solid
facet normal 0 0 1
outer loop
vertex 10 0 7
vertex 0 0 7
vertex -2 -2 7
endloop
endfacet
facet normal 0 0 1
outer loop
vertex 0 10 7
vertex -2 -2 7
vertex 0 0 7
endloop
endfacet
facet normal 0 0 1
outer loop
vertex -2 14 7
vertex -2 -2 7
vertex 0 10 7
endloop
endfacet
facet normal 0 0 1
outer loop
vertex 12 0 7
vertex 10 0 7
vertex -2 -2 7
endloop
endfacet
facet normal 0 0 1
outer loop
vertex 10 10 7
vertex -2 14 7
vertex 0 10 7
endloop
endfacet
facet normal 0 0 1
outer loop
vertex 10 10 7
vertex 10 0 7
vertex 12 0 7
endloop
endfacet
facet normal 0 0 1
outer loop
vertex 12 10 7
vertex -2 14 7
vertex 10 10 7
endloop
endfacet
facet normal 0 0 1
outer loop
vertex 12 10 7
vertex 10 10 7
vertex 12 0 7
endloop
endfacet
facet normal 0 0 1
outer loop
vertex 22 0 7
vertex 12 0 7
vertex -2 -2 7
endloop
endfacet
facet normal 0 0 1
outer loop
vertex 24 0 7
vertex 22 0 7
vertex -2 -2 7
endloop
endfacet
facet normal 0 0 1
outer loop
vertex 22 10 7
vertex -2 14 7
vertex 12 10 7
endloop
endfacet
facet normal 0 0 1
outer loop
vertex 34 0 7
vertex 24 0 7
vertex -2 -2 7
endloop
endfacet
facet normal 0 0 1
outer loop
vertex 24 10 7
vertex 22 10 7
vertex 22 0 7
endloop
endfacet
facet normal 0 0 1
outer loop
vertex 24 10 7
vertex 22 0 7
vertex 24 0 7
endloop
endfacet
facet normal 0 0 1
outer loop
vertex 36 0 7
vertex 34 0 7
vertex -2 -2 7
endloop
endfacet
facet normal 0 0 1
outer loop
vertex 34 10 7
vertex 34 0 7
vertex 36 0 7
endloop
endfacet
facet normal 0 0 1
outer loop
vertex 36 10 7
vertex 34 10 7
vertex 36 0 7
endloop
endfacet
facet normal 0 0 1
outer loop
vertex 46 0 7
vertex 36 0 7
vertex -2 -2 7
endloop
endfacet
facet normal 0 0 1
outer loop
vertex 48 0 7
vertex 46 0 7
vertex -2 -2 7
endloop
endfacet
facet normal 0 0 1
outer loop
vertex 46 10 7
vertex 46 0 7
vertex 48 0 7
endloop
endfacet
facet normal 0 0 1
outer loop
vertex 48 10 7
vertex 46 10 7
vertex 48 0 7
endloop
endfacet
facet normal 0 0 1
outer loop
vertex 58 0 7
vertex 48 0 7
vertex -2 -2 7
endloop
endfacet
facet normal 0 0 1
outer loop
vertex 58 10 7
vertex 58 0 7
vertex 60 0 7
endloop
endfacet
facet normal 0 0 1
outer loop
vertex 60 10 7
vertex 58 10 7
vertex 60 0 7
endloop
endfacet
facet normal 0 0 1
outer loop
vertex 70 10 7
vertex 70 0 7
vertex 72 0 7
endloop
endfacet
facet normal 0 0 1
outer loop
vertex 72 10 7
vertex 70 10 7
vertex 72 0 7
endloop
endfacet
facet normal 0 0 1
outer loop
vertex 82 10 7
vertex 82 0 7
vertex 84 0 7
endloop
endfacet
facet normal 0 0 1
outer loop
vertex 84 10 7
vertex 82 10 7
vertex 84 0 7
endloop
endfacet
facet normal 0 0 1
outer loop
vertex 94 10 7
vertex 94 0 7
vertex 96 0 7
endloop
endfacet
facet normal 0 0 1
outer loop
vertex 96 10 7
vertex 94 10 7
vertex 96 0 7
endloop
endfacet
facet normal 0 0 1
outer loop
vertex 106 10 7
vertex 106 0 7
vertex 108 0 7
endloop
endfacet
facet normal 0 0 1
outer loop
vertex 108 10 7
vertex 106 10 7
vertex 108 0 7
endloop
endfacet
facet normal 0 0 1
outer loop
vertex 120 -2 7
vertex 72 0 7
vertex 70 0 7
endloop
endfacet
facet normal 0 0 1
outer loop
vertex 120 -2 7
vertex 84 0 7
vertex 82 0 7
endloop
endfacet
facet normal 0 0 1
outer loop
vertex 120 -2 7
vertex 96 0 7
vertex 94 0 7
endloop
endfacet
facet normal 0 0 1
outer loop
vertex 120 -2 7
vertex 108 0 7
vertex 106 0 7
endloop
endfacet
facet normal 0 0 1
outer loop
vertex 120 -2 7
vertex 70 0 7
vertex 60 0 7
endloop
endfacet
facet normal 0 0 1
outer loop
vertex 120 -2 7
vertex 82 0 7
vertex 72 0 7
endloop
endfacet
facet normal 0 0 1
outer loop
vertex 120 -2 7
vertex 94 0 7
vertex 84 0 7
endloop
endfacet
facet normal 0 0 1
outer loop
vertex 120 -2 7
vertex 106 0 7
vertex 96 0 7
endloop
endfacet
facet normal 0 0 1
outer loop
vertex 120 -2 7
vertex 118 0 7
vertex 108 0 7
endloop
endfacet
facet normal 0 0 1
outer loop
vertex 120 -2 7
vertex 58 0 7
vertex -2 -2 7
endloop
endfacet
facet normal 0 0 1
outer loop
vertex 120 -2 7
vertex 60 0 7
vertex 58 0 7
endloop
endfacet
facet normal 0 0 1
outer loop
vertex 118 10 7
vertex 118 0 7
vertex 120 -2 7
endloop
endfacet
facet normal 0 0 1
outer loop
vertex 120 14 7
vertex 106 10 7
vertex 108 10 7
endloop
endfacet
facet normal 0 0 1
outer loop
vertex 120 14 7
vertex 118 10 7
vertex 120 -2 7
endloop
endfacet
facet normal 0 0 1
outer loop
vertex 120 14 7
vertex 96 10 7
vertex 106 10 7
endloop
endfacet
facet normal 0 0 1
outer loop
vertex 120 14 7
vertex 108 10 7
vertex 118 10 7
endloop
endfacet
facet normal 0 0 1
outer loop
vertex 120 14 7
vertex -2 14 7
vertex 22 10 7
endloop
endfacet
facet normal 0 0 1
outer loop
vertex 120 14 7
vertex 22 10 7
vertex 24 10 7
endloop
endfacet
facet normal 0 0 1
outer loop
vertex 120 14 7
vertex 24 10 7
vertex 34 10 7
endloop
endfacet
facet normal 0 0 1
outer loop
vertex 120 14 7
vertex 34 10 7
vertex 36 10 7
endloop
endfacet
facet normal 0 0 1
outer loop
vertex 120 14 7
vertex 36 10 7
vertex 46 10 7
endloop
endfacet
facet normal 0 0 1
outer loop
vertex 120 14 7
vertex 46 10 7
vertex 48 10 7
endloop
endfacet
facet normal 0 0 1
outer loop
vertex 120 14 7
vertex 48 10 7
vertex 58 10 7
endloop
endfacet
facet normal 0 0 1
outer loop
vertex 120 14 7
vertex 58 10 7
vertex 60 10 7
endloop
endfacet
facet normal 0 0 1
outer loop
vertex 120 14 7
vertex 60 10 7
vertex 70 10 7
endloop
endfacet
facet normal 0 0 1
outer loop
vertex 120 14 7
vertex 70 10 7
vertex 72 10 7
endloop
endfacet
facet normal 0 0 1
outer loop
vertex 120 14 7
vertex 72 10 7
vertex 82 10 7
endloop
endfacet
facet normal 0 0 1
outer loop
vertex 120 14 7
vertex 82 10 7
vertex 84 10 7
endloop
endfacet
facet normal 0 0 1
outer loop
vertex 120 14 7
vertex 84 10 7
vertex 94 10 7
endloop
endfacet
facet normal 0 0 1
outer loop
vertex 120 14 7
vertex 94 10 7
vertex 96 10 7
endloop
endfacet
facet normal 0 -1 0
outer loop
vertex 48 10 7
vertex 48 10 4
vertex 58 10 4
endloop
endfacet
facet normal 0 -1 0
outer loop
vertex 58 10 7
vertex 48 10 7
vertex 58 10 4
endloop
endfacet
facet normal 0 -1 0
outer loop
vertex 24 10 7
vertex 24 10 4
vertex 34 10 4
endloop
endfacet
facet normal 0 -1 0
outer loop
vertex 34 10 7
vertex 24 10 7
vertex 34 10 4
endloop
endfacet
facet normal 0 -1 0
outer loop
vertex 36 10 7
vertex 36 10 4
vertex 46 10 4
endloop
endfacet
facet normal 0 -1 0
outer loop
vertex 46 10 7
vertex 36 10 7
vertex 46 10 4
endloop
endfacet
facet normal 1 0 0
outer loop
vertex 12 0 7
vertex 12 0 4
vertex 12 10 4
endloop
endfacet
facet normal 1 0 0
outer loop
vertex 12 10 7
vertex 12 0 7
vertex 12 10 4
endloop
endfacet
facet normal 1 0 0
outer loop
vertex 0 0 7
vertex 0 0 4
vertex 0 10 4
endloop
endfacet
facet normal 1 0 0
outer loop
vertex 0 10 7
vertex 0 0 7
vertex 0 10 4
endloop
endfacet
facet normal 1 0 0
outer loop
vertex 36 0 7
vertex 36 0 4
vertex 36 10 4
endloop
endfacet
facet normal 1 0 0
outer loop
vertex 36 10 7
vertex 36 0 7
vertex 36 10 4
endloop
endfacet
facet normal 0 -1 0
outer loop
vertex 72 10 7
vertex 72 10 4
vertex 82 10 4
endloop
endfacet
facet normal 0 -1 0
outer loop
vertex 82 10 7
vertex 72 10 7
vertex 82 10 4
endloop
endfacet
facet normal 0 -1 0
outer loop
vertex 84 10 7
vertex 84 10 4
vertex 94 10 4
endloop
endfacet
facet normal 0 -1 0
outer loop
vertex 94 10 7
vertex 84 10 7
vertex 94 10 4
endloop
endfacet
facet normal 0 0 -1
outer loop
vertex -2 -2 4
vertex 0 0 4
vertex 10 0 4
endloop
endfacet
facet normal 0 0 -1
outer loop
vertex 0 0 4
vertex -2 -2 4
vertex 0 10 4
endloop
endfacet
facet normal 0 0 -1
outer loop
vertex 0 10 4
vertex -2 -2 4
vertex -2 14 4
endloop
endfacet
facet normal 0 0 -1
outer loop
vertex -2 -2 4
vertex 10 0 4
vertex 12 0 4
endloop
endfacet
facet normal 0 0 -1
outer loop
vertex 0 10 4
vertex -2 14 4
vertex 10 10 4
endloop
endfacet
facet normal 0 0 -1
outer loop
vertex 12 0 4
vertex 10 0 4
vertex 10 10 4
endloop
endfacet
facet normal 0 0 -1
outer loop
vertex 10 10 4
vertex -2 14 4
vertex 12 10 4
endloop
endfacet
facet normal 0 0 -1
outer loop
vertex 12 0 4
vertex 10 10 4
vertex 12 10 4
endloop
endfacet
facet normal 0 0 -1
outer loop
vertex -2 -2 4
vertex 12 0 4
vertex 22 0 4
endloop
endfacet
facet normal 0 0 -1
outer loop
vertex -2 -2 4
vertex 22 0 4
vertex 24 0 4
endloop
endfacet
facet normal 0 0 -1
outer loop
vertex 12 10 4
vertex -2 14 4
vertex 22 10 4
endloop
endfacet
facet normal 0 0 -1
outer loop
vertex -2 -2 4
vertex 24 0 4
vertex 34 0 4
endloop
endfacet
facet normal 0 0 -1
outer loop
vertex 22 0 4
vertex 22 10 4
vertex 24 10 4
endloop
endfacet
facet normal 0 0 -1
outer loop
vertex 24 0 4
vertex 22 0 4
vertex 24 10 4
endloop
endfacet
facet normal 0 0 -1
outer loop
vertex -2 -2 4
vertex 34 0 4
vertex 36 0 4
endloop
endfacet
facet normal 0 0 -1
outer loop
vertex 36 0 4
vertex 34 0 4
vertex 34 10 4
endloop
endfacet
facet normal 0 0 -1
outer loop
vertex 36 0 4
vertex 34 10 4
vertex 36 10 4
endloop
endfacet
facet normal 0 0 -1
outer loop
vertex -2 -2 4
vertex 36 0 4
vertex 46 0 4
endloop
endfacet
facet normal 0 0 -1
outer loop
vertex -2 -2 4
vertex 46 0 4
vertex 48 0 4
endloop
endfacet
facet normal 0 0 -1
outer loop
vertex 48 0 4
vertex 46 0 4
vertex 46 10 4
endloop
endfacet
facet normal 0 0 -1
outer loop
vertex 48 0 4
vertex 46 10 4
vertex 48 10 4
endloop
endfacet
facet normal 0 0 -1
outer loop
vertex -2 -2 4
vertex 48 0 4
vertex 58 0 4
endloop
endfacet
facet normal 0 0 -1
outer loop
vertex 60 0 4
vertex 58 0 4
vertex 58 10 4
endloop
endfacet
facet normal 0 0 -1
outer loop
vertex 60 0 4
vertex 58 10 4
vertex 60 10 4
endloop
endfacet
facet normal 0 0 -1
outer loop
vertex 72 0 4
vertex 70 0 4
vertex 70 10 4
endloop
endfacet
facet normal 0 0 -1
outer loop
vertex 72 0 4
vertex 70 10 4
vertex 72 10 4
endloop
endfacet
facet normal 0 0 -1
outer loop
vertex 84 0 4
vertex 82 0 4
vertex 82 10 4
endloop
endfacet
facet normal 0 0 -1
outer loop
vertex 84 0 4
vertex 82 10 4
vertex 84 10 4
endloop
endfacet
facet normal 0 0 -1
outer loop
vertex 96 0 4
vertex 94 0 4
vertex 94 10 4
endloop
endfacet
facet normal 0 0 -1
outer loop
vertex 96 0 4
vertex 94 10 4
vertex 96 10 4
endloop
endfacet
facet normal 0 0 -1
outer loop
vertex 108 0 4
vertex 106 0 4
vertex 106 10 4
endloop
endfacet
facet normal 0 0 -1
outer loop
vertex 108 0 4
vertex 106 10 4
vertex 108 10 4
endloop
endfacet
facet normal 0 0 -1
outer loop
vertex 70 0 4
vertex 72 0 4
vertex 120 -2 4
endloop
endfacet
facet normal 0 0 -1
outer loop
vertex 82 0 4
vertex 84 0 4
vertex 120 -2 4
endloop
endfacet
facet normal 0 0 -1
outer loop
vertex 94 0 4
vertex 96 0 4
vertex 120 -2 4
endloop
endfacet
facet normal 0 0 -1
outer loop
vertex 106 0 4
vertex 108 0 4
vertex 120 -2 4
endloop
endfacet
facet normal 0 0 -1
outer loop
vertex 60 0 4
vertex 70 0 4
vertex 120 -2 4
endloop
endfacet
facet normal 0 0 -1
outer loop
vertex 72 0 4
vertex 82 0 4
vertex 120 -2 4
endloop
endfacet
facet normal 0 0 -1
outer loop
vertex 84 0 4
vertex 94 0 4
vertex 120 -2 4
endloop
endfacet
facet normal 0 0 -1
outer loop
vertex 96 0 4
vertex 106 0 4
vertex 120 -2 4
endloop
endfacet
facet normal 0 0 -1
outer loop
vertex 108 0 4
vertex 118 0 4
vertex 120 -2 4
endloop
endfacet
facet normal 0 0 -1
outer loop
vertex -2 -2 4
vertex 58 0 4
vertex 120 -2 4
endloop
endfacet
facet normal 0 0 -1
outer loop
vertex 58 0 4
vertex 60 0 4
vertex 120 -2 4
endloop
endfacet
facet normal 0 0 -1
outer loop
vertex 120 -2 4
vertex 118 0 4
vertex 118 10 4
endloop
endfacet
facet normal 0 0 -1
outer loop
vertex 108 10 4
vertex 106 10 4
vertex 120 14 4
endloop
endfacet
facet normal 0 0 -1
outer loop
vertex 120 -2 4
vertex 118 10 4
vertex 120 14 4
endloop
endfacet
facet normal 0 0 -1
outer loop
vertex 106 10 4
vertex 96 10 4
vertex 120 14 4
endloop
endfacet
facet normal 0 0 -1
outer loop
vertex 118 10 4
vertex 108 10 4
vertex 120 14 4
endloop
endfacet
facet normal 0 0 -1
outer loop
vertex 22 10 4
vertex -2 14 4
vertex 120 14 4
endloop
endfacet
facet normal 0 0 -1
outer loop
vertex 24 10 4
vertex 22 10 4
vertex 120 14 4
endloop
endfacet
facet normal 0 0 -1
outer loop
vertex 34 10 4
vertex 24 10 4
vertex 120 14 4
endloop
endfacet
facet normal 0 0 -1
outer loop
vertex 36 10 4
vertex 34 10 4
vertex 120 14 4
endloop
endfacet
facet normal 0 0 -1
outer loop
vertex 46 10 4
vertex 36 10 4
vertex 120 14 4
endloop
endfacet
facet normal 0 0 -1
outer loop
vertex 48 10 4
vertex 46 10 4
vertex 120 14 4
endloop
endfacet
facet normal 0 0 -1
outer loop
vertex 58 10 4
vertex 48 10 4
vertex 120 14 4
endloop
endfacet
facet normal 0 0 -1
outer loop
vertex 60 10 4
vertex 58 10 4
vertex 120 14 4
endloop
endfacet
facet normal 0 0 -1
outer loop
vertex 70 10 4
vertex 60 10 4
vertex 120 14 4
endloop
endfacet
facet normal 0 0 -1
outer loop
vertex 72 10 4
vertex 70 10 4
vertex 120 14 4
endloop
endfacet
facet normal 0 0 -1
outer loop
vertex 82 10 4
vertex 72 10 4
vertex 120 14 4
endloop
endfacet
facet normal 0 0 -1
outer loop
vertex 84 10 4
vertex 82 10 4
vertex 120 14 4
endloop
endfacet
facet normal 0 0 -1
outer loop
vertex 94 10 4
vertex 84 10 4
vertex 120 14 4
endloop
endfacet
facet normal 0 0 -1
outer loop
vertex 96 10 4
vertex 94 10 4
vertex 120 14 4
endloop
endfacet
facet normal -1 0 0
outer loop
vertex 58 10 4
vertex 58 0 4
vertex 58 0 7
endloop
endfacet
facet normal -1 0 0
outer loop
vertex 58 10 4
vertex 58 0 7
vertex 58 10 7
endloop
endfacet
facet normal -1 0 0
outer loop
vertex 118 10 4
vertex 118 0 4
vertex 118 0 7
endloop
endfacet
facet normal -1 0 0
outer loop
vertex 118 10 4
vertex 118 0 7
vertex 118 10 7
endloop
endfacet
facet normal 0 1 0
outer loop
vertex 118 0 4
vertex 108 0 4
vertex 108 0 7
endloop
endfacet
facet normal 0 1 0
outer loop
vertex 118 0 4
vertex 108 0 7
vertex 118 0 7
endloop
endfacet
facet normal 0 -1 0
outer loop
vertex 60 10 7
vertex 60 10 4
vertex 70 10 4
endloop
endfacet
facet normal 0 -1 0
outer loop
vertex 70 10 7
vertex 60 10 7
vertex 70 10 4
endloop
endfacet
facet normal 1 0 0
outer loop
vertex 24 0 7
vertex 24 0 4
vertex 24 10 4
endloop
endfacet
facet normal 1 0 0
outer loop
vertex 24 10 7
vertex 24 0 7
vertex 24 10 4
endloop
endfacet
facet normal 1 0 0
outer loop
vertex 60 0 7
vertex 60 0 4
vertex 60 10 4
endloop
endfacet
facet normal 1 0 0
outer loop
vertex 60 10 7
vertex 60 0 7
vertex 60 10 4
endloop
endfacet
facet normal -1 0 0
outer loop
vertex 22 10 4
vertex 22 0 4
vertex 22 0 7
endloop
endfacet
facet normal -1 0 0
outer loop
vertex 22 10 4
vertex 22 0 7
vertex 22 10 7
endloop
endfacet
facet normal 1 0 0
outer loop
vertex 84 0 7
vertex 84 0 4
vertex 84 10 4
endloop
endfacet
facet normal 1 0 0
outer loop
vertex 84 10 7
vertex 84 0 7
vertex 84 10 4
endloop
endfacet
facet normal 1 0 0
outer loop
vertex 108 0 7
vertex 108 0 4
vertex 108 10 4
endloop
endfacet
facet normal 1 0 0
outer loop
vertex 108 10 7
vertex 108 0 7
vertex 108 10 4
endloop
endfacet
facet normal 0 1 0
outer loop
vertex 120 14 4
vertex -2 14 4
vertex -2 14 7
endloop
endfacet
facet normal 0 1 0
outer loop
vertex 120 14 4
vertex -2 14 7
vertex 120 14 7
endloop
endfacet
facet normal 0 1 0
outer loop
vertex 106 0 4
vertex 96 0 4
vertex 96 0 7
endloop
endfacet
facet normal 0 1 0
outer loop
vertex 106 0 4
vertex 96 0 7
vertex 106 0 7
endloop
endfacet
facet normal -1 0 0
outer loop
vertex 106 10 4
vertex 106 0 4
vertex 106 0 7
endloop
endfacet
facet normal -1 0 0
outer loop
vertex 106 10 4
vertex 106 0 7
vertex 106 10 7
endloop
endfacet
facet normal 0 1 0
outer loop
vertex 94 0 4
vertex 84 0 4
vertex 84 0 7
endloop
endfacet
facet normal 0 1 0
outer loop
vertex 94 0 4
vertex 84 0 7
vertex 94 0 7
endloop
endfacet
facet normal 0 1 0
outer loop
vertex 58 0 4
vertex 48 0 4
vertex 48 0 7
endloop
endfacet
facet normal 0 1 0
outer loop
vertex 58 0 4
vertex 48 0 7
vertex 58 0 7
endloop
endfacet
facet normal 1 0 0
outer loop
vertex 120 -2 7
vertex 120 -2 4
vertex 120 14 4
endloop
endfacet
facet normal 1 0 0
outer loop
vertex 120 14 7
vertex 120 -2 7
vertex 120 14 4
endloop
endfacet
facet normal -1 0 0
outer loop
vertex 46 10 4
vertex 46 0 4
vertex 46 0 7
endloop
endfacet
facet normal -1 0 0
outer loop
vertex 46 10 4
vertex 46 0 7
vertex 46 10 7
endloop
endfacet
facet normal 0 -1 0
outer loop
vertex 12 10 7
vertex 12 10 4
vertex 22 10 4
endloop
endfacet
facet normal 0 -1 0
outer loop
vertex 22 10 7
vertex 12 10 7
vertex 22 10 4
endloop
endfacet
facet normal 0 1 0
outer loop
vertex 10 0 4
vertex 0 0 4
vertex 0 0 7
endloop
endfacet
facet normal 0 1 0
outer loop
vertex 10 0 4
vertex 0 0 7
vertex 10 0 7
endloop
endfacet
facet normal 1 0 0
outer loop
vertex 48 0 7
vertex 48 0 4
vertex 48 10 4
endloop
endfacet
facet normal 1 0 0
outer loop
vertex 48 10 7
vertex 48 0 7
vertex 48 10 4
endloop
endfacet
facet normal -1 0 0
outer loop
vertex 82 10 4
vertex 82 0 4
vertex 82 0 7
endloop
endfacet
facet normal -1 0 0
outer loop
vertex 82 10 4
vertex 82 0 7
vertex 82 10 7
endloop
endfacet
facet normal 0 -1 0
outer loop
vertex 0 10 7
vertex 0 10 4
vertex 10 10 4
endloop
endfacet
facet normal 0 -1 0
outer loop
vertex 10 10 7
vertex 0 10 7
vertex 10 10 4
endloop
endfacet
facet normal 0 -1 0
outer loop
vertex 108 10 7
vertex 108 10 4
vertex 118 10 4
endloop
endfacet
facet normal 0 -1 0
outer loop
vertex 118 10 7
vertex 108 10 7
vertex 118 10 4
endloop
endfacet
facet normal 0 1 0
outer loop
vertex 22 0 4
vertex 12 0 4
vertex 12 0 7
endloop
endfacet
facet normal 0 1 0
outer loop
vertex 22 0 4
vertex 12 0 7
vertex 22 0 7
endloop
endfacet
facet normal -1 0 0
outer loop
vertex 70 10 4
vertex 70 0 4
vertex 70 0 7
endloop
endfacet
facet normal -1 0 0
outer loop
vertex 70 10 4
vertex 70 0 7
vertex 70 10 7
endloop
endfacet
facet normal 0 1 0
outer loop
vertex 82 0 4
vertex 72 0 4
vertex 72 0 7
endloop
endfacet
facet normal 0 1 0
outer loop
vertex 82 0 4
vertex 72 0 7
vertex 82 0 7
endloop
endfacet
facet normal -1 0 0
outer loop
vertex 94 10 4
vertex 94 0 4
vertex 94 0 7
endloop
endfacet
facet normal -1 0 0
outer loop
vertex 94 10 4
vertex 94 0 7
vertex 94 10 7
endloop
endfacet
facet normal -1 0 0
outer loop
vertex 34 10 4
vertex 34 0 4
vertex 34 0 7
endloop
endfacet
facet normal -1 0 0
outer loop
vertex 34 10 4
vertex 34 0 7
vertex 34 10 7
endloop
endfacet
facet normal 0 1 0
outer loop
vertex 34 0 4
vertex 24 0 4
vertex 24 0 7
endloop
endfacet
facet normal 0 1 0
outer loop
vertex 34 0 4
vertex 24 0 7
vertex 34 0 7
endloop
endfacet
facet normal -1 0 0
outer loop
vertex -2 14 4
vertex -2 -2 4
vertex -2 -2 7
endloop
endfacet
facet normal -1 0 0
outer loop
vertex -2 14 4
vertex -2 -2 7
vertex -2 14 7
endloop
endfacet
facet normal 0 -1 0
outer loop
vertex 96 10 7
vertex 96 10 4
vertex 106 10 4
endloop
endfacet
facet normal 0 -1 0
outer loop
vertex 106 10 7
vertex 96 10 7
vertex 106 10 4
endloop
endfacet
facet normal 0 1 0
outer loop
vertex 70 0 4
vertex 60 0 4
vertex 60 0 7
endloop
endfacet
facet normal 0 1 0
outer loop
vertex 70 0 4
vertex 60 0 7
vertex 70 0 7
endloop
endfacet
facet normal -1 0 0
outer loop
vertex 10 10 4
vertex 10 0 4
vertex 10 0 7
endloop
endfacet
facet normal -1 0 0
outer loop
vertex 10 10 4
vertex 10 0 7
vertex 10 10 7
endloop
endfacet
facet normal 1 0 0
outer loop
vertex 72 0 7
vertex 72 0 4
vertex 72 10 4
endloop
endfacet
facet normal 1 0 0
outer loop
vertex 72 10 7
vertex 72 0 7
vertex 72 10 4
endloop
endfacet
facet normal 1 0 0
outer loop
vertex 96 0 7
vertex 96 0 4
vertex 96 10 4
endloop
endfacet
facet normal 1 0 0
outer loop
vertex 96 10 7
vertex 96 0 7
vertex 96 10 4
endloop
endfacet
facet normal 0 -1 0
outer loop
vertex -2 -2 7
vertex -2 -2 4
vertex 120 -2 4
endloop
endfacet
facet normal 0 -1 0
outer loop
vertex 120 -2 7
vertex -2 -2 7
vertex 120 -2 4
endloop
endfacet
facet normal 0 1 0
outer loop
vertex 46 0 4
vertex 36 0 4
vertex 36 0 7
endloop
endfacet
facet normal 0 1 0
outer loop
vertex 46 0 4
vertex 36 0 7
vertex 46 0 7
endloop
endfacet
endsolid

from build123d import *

# Parameters (mm, degrees)
BOX_W         = 10
BOX_H         = 10
BOX_DEPTH     = 10
ARRAY_X_COUNT = 10
ARRAY_X_PITCH = 12
BOX001_W      = 122
BOX001_H      = 16
BOX001_DEPTH  = 3


with BuildPart() as array:
    # Box → Box (new body)
    with BuildSketch(Plane.XY):
        with Locations((5, 5)):
            Rectangle(BOX_W, BOX_H)
    extrude(amount=BOX_DEPTH)

    # Array X: Array ×10


with BuildPart() as array_1:
    add(array.part)
    with Locations(*[(i * ARRAY_X_PITCH, 0, 0) for i in range(1, ARRAY_X_COUNT)]):
        add(array.part)


with BuildPart() as cut:
    # Box001 → Box001 (new body)
    with BuildSketch(Plane(origin=(-2, -2, 4), x_dir=(1, 0, 0), z_dir=(0, 0, 1))):
        with Locations((61, 8)):
            Rectangle(BOX001_W, BOX001_H)
    extrude(amount=BOX001_DEPTH)

    # Cut: cut Array
    add(array_1.part, mode=Mode.SUBTRACT)


solid = cut.part
